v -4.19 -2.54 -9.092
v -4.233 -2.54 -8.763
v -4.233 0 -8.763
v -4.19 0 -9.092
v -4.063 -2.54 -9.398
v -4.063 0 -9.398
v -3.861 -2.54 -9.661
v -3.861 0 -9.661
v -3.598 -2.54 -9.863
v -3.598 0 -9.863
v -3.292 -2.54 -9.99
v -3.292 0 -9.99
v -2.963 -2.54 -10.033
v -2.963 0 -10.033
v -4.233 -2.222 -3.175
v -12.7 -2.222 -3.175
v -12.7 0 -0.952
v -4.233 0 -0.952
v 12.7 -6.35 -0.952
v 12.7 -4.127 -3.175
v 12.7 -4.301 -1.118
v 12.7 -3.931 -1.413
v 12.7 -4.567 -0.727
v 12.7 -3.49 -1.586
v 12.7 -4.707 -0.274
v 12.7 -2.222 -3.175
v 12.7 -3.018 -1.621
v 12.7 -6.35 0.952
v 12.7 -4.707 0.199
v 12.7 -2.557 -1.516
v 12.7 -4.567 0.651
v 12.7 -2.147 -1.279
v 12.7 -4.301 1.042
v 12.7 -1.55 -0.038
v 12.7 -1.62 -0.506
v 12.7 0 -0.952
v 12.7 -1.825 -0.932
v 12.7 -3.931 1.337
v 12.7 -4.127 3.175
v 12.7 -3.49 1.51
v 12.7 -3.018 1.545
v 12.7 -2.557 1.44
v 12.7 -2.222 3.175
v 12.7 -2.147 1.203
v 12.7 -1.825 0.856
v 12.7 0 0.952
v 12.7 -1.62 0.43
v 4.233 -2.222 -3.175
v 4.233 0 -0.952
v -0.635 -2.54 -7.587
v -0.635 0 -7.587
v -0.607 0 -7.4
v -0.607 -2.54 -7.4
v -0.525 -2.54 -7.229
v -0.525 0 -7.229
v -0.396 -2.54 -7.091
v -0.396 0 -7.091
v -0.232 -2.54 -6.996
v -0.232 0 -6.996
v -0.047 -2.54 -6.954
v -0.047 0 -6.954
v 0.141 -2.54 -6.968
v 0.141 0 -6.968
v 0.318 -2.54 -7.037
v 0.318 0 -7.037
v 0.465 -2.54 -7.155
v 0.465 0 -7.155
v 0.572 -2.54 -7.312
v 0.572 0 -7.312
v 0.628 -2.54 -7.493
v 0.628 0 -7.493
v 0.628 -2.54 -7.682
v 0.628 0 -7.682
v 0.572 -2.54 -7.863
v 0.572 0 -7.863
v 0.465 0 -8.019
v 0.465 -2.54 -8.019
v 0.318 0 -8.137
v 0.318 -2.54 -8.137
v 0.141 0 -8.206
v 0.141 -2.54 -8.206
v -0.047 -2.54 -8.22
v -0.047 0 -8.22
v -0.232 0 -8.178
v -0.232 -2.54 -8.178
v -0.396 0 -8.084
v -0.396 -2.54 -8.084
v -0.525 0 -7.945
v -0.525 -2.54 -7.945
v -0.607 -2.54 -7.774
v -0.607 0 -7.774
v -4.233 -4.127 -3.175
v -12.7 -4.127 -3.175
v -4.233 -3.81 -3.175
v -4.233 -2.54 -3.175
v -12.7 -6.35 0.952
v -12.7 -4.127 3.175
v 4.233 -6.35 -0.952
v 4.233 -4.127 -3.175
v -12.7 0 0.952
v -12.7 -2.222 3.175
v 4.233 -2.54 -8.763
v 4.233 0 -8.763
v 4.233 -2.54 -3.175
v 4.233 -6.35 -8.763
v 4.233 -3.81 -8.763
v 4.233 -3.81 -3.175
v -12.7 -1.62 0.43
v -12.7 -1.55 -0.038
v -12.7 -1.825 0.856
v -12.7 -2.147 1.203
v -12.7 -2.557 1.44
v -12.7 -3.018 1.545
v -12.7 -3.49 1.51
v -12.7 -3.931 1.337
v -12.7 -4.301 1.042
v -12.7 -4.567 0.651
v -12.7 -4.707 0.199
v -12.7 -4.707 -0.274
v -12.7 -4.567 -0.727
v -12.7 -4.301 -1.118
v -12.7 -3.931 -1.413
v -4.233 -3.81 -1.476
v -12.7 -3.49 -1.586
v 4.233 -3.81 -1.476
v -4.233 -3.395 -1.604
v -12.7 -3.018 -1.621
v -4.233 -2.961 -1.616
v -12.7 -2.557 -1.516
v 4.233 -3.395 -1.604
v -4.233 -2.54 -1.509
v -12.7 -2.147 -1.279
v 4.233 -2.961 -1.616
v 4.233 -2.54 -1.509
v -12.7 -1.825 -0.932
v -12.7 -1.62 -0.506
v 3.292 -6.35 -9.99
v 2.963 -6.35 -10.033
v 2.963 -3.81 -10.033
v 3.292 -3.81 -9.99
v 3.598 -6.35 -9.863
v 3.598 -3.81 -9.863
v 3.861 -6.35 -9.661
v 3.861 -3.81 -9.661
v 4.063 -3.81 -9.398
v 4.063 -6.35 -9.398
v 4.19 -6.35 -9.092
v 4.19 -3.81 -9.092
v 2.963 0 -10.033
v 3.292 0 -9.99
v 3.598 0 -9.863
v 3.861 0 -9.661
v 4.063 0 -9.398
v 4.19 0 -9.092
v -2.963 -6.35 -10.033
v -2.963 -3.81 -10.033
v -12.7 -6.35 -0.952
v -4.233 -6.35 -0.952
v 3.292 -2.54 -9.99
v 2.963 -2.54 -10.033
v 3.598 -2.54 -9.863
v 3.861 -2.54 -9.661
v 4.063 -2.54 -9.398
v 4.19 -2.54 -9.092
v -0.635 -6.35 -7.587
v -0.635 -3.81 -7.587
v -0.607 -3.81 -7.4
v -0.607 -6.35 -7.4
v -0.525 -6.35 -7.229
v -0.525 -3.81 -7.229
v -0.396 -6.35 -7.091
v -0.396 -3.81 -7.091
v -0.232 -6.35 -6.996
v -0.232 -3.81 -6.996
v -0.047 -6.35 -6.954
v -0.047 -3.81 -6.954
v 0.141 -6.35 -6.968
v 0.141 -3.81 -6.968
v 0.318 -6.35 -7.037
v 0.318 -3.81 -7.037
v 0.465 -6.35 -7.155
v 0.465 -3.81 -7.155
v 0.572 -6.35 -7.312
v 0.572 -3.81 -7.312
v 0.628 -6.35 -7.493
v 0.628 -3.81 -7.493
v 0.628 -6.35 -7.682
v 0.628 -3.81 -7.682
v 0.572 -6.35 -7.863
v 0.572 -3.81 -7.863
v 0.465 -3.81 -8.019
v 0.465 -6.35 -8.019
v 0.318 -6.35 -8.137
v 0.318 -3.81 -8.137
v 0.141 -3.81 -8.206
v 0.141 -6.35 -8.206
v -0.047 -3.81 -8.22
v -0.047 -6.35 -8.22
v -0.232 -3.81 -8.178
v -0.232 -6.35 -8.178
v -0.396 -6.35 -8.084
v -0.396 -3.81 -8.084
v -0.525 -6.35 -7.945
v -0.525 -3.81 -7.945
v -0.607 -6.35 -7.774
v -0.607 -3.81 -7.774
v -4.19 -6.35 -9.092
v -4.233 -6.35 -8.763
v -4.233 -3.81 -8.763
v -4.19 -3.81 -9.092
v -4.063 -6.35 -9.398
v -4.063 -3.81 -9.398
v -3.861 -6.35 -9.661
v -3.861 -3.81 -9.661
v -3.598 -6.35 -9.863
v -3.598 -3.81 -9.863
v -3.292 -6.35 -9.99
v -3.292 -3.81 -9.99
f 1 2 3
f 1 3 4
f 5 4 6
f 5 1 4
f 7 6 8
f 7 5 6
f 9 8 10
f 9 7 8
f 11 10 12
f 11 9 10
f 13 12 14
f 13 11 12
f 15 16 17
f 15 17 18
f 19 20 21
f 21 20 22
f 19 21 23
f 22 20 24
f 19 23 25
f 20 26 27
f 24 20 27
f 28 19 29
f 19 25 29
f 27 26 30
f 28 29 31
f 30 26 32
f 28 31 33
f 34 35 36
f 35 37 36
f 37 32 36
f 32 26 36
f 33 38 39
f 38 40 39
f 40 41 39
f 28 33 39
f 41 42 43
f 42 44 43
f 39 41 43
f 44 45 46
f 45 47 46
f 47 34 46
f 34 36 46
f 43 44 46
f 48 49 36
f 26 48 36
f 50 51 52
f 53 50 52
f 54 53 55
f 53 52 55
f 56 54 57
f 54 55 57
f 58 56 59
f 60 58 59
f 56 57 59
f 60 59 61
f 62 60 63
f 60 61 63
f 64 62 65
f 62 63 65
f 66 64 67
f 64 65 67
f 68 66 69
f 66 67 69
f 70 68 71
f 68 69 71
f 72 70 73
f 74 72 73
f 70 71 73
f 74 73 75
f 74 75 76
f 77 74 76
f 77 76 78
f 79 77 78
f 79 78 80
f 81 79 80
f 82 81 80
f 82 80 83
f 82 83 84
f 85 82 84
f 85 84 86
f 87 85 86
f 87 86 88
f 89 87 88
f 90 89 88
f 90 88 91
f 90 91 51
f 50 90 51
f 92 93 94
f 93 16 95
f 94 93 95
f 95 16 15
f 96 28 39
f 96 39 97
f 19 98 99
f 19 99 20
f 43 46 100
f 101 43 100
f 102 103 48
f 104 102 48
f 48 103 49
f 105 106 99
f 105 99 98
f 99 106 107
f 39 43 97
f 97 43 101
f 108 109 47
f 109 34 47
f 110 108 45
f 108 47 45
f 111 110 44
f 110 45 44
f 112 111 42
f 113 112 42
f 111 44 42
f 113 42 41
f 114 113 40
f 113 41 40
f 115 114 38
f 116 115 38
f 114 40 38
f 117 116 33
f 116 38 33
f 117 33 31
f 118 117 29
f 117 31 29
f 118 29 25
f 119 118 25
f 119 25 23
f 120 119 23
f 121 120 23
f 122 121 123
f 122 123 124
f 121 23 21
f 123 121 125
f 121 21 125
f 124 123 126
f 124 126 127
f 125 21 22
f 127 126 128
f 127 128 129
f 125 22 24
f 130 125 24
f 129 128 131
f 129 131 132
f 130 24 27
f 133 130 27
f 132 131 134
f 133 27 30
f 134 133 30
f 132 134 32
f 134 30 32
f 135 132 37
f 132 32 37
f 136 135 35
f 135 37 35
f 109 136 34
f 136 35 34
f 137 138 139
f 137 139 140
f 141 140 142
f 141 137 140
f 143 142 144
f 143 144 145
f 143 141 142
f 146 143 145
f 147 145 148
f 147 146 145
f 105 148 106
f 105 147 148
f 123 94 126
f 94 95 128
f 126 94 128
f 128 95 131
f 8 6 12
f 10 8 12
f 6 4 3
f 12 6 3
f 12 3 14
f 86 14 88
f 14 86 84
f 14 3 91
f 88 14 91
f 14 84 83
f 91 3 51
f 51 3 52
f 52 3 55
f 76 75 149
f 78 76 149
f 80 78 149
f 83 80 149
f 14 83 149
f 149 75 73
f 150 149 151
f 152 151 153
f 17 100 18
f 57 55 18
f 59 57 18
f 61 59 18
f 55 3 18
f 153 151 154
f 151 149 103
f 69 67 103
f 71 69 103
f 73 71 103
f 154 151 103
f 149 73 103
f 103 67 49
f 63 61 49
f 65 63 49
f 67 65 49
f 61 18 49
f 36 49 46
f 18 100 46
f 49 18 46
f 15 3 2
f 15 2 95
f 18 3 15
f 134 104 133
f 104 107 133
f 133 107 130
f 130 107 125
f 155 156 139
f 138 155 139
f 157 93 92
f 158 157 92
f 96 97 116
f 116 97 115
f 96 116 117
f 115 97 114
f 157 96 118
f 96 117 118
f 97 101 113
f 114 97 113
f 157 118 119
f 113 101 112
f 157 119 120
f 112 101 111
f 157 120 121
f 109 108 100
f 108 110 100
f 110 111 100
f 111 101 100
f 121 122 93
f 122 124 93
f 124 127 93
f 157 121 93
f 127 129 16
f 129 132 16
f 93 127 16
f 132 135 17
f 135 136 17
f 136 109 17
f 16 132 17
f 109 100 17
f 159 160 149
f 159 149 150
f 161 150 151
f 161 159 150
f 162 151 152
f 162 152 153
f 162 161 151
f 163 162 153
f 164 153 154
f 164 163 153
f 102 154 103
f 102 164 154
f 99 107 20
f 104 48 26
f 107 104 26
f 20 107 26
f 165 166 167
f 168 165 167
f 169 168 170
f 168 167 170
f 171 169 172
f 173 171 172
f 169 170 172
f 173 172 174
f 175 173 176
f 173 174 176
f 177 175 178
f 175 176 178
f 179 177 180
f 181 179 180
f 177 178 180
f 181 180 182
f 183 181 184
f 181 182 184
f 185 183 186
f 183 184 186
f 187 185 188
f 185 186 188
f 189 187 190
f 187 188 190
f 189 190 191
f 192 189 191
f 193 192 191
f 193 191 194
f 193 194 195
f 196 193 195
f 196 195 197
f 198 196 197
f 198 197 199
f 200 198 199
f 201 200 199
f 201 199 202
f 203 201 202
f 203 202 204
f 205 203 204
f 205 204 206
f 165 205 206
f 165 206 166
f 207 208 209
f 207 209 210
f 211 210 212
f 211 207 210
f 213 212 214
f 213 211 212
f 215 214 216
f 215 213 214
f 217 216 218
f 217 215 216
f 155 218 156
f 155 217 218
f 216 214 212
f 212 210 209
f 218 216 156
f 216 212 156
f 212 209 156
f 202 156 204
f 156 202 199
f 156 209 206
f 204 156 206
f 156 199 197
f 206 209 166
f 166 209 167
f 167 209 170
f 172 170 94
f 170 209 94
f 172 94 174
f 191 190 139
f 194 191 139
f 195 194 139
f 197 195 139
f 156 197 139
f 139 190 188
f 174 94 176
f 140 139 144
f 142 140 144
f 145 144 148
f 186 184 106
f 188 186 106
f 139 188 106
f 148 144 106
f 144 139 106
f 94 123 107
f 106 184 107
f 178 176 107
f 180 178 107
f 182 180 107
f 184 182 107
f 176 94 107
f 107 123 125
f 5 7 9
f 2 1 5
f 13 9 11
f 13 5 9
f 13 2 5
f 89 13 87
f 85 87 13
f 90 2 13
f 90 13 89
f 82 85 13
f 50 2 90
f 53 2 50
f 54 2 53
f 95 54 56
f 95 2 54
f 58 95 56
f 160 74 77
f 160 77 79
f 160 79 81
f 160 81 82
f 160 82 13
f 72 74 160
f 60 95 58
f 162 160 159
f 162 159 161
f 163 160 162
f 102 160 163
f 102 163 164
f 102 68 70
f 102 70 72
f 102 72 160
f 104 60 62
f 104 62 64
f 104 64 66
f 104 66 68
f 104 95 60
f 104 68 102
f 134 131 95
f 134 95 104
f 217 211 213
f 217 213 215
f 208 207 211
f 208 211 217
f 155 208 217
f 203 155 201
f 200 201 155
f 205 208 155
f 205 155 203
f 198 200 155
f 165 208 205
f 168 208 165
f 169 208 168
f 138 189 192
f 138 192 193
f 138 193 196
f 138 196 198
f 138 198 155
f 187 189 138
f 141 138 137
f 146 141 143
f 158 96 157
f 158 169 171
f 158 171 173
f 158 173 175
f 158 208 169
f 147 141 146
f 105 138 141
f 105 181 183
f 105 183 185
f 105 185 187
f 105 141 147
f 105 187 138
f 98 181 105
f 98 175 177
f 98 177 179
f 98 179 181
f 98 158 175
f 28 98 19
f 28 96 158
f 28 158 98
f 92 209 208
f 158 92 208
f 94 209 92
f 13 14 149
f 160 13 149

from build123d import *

# Parameters (mm, degrees)
F1_DEPTH = 6.35
F0_W     = 8.4666666667
F0_H     = 6.858
F2_DEPTH = 6.35
F3_SIZE  = 2.2225
F4_R     = 1.27
F5_T     = 2.54
F7_D     = 3.175
F7_DEPTH = 25.4
F7_TIP   = 0.9538662327
F9_D     = 1.27
F9_DEPTH = 25.4
F9_TIP   = 0.3815464931


# Not quite as in the source:
# - a shell that OpenCascade refuses in one call is made with other operations: the cavity is built on its own and cut out


with BuildPart() as f1:
    # F0 (on Front) → F1 (new body)
    with BuildSketch(Plane.XZ):
        Polygon((12.7, -3.175), (12.7, 3.175), (-12.7, 3.175), (-12.7, -3.175), (-4.2333333333, -3.175), (4.2333333333, -3.175), align=None)
    extrude(amount=F1_DEPTH)

    # F0 (on Front) → F2 (join)
    with BuildSketch(Plane.XZ):
        with Locations((0, -6.604)):
            Rectangle(F0_W, F0_H)
    extrude(amount=F2_DEPTH)

    # F3
    f3_edges = [f1.edges().sort_by_distance(p)[0] for p in [
        (0, -6.35, 3.175),
        (8.466667, -6.35, -3.175),
        (-8.466667, -6.35, -3.175),
        (0, 0, 3.175),
        (8.466667, 0, -3.175),
        (-8.466667, 0, -3.175),
    ]]
    chamfer(f3_edges, length=F3_SIZE)

    # F4
    f4_edges = [f1.edges().sort_by_distance(p)[0] for p in [
        (-4.233333, -3.175, -10.033),
        (4.233333, -3.175, -10.033),
    ]]
    fillet(f4_edges, radius=F4_R)

    # F5: shell of thickness 2.54, made by hand


with BuildPart() as f5_core1:
    # F5_t2: copy of F1
    add(f1.part)

    # the walls: a layer under each face that stays
    f5_faces = [f5_core1.faces().sort_by_distance(p)[0] for p in [
        (0, 0, -4.54025),
        (8.4666666667, -1.11125, -2.06375),
        (12.7, -3.175, 0),
        (0, -1.11125, 2.06375),
        (-12.7, -3.175, 0),
        (-8.4666666667, -1.11125, -2.06375),
        (0, -6.35, -4.54025),
        (8.4666666667, -3.175, -3.175),
        (8.4666666667, -5.23875, -2.06375),
        (0, -5.23875, 2.06375),
        (0, -3.175, 3.175),
        (-8.4666666667, -3.175, -3.175),
        (-8.4666666667, -5.23875, -2.06375),
    ]]
    thicken(f5_faces, amount=-F5_T, mode=Mode.SUBTRACT)


with BuildPart() as f1_1:
    add(f1.part)

    # what is left inside the walls is the cavity
    f5_cavity = [f5_core1.part.solids().sort_by_distance(p)[0] for p in [
        (0, -2.5654, -6.721867),
    ]]
    add(f5_cavity, mode=Mode.SUBTRACT)

    # F7
    with Locations(Plane(origin=(-12.7, 0, 0), x_dir=(0, -1, 0), z_dir=(-1, 0, 0))):
        with Locations((3.1371232575, -0.0378767425)):
            Hole(F7_D / 2, depth=F7_DEPTH)
            with Locations((0, 0, -(F7_DEPTH + F7_TIP / 2))):  # 118° drill point
                Cone(0, F7_D / 2, F7_TIP, mode=Mode.SUBTRACT)

    # F9
    with Locations(Plane.XZ.offset(6.35)):
        with Locations((0, -7.5871711597)):
            Hole(F9_D / 2, depth=F9_DEPTH)
            with Locations((0, 0, -(F9_DEPTH + F9_TIP / 2))):  # 118° drill point
                Cone(0, F9_D / 2, F9_TIP, mode=Mode.SUBTRACT)


solid = f1_1.part
